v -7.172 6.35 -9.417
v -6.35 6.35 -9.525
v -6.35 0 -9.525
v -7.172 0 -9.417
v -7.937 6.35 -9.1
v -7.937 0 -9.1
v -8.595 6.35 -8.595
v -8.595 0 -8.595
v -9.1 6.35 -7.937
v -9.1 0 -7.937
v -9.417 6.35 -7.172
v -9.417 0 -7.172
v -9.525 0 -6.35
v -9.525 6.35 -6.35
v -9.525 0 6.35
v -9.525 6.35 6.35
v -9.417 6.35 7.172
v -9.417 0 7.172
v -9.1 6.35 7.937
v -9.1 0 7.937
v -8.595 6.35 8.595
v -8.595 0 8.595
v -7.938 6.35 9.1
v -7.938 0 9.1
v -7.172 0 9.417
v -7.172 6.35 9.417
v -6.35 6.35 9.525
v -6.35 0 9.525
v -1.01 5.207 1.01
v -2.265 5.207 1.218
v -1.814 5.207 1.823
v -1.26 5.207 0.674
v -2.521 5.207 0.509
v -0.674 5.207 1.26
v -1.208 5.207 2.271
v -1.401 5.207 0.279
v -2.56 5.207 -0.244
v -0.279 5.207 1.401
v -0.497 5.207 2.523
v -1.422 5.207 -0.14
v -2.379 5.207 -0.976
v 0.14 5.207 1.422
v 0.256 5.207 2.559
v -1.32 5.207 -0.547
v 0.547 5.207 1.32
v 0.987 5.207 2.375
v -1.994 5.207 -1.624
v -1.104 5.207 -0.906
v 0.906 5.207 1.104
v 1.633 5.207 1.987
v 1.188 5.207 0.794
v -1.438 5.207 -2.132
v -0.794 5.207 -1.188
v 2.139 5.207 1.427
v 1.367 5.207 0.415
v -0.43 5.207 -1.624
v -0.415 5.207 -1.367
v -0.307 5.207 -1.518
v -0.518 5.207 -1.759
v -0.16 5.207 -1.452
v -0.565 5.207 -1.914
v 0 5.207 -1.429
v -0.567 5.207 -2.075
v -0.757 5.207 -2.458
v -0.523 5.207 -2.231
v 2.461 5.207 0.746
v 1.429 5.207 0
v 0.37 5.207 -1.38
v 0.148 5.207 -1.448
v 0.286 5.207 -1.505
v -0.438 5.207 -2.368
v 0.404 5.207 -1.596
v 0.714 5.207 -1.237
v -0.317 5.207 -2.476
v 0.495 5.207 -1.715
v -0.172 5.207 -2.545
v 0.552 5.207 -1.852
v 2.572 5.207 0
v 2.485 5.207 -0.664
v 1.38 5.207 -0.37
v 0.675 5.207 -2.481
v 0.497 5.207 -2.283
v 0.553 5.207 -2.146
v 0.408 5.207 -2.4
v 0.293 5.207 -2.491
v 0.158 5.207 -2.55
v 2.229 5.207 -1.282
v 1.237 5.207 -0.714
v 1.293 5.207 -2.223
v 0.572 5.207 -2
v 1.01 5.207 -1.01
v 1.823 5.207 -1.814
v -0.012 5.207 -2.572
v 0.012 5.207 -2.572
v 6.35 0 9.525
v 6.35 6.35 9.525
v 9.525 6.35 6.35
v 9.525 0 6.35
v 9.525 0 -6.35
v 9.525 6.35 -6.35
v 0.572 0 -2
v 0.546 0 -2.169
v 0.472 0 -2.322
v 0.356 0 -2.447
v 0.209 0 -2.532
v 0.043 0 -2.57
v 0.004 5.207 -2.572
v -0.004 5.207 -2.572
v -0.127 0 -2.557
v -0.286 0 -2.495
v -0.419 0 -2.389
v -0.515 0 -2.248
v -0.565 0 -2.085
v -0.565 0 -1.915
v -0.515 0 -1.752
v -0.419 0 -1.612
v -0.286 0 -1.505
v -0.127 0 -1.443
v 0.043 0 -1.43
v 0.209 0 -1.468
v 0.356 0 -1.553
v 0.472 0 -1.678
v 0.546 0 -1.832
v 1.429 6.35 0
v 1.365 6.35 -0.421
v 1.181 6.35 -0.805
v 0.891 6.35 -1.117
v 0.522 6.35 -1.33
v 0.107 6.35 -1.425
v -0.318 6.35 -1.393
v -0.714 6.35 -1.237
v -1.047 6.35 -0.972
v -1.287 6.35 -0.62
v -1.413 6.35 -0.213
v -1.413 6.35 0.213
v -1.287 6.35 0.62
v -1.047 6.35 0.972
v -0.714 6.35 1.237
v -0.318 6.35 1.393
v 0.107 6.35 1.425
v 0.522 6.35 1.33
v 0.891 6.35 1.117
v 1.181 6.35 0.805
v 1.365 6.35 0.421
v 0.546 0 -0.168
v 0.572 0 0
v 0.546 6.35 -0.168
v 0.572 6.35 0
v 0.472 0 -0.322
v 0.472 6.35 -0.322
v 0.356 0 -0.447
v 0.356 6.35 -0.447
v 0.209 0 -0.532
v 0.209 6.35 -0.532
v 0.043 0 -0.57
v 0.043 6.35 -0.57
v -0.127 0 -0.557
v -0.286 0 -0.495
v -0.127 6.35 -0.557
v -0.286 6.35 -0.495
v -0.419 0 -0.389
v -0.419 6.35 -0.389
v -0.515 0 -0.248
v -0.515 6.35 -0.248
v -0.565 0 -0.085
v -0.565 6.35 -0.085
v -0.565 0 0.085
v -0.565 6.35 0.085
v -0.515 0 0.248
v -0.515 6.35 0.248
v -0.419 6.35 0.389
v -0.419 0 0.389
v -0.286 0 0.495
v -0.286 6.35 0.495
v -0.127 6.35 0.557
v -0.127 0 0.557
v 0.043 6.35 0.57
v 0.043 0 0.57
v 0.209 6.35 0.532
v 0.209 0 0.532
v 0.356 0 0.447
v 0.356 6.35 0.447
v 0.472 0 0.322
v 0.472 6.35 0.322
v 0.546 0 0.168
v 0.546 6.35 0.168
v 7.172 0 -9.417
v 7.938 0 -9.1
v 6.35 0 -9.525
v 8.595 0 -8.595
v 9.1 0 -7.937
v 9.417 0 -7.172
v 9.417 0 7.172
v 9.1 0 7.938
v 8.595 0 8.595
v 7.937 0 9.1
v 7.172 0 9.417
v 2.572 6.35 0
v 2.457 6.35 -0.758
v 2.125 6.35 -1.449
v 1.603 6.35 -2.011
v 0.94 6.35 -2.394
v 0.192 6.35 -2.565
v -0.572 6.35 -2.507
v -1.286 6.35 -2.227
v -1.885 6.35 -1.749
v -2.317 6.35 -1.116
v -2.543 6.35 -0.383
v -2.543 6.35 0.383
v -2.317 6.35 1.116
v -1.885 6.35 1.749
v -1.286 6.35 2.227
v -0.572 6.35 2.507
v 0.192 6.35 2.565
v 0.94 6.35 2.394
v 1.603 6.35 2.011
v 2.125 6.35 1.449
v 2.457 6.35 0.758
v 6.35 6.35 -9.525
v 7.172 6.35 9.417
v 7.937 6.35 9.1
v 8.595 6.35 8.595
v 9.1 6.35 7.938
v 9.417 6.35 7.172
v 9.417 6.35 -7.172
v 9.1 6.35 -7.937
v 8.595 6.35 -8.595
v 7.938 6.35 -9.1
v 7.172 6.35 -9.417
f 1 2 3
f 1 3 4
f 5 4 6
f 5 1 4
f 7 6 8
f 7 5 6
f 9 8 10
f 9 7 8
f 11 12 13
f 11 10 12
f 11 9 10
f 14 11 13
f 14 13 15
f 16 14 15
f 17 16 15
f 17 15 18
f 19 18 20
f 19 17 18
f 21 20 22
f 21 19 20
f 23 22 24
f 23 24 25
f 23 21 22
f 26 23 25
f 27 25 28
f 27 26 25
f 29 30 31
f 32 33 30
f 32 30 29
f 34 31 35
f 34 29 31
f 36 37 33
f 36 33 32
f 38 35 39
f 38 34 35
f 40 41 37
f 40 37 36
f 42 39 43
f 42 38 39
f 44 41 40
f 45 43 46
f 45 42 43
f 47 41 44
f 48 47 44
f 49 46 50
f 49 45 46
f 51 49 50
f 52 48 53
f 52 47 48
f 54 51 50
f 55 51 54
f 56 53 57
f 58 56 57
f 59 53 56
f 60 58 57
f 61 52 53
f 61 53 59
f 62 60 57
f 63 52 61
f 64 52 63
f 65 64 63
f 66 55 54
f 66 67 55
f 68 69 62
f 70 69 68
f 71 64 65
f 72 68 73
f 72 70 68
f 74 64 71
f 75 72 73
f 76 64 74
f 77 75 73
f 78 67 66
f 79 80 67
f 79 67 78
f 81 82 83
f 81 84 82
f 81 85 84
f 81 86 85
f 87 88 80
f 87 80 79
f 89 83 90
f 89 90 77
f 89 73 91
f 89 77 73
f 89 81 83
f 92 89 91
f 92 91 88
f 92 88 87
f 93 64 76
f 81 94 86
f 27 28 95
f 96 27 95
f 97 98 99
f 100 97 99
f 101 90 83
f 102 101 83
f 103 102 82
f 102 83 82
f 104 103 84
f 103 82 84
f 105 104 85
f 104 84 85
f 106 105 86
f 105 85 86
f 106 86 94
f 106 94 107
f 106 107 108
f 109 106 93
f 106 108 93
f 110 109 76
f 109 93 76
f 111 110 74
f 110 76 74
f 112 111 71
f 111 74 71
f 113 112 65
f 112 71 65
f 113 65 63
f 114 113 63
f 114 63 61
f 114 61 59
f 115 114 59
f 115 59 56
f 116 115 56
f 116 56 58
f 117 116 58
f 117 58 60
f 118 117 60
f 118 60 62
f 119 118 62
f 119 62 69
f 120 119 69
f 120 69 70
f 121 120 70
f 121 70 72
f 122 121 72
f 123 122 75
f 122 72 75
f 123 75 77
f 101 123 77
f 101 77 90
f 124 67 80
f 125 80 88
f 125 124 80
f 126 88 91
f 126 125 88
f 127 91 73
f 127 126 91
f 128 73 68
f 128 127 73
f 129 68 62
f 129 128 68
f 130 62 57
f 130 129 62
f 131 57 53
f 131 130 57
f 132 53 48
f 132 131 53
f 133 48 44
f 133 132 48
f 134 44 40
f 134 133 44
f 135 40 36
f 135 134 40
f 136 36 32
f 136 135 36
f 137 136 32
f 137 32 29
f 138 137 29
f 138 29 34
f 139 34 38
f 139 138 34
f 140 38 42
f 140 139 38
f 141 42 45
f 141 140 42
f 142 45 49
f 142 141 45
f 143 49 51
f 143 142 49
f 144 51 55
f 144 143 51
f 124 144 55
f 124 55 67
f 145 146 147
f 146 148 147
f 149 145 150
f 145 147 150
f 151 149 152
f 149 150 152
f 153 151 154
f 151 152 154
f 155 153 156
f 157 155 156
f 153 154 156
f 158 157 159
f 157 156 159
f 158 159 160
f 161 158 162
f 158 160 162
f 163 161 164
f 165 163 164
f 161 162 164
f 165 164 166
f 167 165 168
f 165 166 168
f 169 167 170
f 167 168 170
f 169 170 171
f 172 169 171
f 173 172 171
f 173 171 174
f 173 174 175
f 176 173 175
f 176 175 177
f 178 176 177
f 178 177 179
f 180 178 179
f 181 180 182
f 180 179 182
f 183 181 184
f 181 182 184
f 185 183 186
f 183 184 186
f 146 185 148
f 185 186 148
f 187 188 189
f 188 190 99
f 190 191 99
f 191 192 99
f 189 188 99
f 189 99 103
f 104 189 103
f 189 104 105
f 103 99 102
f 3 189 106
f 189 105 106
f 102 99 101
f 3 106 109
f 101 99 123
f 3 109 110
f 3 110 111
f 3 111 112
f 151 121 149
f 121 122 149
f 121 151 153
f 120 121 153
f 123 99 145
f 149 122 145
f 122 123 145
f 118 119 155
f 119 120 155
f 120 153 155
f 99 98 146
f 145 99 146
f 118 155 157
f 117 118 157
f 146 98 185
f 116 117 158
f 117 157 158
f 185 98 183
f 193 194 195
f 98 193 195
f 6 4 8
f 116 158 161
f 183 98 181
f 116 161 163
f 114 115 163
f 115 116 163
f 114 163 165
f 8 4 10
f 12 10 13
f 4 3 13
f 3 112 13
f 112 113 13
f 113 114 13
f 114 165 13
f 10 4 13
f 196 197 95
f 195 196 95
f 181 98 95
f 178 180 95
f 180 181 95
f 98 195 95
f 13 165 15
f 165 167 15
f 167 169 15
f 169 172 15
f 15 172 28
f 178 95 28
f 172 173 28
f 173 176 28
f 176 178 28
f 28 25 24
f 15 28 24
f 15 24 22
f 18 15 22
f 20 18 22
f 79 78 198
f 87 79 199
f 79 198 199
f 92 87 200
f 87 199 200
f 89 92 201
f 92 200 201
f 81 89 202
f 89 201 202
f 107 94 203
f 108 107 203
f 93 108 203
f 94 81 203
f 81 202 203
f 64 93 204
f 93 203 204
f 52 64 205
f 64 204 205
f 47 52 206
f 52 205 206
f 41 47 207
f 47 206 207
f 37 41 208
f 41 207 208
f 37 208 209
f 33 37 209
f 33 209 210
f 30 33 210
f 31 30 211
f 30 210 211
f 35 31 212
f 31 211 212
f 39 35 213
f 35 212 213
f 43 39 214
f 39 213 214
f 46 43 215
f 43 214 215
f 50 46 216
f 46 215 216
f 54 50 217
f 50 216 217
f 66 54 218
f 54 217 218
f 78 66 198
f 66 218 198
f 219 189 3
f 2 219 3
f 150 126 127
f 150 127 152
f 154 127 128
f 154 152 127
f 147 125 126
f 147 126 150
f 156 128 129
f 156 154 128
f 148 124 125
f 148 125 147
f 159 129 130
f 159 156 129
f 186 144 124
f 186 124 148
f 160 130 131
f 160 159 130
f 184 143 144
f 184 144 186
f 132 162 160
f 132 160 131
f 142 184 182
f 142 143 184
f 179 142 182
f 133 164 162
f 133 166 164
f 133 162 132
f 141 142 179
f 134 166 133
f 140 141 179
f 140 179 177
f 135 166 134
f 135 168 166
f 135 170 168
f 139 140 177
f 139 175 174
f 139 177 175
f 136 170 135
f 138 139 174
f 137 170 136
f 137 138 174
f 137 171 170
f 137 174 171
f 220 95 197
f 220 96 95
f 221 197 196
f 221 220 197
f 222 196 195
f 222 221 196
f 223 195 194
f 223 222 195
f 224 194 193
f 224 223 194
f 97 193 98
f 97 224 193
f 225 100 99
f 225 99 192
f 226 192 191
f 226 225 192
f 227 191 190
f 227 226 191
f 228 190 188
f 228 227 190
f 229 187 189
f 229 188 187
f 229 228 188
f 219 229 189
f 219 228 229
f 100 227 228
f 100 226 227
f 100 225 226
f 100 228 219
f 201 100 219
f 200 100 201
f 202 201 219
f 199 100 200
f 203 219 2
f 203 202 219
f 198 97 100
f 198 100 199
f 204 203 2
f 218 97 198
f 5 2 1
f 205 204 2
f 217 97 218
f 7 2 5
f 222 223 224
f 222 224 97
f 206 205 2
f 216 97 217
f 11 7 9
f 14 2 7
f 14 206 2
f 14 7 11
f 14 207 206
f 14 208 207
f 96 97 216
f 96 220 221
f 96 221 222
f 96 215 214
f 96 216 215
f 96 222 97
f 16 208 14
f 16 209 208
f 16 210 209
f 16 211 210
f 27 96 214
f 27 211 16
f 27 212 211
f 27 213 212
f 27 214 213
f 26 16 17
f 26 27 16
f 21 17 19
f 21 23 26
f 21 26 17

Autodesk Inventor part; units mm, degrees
ref_plane "YZ Plane" through (0, 0, 0) normal (1, 0, 0) x (0, 1, 0)
ref_plane "XZ Plane" through (0, 0, 0) normal (0, 1, 0) x (-1, 0, 0)
ref_plane "XY Plane" through (0, 0, 0) normal (0, 0, 1) x (1, 0, 0)
sketch "Sketch1" plane through (0, 0, 0) normal (0, 1, 0) x (-1, 0, 0)
  line L0 (9.525, 9.525) -> (-9.525, 9.525)
  line L1 (-9.525, 9.525) -> (-9.525, -9.525)
  line L2 (-9.525, -9.525) -> (9.525, -9.525)
  line L3 (9.525, -9.525) -> (9.525, 9.525)
  point P0 (0, 0)
  dimension "d0" = 19.05
  dimension "d1" = 19.05
  dimension "d2" = 9.525
  dimension "d3" = 9.525
extrude "Extrusion1" add sketch "Sketch1" along normal blind 6.35
sketch "Sketch2" plane through (0, 6.35, 0) normal (0, 1, 0) x (1, 0, 0)
  circle A0 centre (0, 0) radius 1.4288
  circle A1 centre (0, 0) radius 2.5717
  circle A2 centre (0, 0) radius 0.5715
  dimension "d6" = 2.8575
  dimension "d7" = 5.1435
  dimension "d8" = 1.143
extrude "Extrusion2" cut sketch "Sketch2" against normal blind 1.143 contours A1
extrude "Extrusion3" cut sketch "Sketch2" against normal through all contours A2
sketch "Sketch3" plane through (0, 5.207, 0) normal (0, 1, 0) x (1, 0, 0)
  circle A0 centre (0, 2.0003) radius 0.5715
  line L0 (0, 2.0003) -> (0, 0)
  dimension "d13" = 1.143
  dimension "d14" = 2.0002
extrude "Extrusion4" cut sketch "Sketch3" against normal through all
fillet "Fillet1" radius 3.175 4 edges at (-9.525, 3.175, 9.525) (9.525, 3.175, 9.525) (9.525, 3.175, -9.525) (-9.525, 3.175, -9.525)
properties part number "Unit_v3"
